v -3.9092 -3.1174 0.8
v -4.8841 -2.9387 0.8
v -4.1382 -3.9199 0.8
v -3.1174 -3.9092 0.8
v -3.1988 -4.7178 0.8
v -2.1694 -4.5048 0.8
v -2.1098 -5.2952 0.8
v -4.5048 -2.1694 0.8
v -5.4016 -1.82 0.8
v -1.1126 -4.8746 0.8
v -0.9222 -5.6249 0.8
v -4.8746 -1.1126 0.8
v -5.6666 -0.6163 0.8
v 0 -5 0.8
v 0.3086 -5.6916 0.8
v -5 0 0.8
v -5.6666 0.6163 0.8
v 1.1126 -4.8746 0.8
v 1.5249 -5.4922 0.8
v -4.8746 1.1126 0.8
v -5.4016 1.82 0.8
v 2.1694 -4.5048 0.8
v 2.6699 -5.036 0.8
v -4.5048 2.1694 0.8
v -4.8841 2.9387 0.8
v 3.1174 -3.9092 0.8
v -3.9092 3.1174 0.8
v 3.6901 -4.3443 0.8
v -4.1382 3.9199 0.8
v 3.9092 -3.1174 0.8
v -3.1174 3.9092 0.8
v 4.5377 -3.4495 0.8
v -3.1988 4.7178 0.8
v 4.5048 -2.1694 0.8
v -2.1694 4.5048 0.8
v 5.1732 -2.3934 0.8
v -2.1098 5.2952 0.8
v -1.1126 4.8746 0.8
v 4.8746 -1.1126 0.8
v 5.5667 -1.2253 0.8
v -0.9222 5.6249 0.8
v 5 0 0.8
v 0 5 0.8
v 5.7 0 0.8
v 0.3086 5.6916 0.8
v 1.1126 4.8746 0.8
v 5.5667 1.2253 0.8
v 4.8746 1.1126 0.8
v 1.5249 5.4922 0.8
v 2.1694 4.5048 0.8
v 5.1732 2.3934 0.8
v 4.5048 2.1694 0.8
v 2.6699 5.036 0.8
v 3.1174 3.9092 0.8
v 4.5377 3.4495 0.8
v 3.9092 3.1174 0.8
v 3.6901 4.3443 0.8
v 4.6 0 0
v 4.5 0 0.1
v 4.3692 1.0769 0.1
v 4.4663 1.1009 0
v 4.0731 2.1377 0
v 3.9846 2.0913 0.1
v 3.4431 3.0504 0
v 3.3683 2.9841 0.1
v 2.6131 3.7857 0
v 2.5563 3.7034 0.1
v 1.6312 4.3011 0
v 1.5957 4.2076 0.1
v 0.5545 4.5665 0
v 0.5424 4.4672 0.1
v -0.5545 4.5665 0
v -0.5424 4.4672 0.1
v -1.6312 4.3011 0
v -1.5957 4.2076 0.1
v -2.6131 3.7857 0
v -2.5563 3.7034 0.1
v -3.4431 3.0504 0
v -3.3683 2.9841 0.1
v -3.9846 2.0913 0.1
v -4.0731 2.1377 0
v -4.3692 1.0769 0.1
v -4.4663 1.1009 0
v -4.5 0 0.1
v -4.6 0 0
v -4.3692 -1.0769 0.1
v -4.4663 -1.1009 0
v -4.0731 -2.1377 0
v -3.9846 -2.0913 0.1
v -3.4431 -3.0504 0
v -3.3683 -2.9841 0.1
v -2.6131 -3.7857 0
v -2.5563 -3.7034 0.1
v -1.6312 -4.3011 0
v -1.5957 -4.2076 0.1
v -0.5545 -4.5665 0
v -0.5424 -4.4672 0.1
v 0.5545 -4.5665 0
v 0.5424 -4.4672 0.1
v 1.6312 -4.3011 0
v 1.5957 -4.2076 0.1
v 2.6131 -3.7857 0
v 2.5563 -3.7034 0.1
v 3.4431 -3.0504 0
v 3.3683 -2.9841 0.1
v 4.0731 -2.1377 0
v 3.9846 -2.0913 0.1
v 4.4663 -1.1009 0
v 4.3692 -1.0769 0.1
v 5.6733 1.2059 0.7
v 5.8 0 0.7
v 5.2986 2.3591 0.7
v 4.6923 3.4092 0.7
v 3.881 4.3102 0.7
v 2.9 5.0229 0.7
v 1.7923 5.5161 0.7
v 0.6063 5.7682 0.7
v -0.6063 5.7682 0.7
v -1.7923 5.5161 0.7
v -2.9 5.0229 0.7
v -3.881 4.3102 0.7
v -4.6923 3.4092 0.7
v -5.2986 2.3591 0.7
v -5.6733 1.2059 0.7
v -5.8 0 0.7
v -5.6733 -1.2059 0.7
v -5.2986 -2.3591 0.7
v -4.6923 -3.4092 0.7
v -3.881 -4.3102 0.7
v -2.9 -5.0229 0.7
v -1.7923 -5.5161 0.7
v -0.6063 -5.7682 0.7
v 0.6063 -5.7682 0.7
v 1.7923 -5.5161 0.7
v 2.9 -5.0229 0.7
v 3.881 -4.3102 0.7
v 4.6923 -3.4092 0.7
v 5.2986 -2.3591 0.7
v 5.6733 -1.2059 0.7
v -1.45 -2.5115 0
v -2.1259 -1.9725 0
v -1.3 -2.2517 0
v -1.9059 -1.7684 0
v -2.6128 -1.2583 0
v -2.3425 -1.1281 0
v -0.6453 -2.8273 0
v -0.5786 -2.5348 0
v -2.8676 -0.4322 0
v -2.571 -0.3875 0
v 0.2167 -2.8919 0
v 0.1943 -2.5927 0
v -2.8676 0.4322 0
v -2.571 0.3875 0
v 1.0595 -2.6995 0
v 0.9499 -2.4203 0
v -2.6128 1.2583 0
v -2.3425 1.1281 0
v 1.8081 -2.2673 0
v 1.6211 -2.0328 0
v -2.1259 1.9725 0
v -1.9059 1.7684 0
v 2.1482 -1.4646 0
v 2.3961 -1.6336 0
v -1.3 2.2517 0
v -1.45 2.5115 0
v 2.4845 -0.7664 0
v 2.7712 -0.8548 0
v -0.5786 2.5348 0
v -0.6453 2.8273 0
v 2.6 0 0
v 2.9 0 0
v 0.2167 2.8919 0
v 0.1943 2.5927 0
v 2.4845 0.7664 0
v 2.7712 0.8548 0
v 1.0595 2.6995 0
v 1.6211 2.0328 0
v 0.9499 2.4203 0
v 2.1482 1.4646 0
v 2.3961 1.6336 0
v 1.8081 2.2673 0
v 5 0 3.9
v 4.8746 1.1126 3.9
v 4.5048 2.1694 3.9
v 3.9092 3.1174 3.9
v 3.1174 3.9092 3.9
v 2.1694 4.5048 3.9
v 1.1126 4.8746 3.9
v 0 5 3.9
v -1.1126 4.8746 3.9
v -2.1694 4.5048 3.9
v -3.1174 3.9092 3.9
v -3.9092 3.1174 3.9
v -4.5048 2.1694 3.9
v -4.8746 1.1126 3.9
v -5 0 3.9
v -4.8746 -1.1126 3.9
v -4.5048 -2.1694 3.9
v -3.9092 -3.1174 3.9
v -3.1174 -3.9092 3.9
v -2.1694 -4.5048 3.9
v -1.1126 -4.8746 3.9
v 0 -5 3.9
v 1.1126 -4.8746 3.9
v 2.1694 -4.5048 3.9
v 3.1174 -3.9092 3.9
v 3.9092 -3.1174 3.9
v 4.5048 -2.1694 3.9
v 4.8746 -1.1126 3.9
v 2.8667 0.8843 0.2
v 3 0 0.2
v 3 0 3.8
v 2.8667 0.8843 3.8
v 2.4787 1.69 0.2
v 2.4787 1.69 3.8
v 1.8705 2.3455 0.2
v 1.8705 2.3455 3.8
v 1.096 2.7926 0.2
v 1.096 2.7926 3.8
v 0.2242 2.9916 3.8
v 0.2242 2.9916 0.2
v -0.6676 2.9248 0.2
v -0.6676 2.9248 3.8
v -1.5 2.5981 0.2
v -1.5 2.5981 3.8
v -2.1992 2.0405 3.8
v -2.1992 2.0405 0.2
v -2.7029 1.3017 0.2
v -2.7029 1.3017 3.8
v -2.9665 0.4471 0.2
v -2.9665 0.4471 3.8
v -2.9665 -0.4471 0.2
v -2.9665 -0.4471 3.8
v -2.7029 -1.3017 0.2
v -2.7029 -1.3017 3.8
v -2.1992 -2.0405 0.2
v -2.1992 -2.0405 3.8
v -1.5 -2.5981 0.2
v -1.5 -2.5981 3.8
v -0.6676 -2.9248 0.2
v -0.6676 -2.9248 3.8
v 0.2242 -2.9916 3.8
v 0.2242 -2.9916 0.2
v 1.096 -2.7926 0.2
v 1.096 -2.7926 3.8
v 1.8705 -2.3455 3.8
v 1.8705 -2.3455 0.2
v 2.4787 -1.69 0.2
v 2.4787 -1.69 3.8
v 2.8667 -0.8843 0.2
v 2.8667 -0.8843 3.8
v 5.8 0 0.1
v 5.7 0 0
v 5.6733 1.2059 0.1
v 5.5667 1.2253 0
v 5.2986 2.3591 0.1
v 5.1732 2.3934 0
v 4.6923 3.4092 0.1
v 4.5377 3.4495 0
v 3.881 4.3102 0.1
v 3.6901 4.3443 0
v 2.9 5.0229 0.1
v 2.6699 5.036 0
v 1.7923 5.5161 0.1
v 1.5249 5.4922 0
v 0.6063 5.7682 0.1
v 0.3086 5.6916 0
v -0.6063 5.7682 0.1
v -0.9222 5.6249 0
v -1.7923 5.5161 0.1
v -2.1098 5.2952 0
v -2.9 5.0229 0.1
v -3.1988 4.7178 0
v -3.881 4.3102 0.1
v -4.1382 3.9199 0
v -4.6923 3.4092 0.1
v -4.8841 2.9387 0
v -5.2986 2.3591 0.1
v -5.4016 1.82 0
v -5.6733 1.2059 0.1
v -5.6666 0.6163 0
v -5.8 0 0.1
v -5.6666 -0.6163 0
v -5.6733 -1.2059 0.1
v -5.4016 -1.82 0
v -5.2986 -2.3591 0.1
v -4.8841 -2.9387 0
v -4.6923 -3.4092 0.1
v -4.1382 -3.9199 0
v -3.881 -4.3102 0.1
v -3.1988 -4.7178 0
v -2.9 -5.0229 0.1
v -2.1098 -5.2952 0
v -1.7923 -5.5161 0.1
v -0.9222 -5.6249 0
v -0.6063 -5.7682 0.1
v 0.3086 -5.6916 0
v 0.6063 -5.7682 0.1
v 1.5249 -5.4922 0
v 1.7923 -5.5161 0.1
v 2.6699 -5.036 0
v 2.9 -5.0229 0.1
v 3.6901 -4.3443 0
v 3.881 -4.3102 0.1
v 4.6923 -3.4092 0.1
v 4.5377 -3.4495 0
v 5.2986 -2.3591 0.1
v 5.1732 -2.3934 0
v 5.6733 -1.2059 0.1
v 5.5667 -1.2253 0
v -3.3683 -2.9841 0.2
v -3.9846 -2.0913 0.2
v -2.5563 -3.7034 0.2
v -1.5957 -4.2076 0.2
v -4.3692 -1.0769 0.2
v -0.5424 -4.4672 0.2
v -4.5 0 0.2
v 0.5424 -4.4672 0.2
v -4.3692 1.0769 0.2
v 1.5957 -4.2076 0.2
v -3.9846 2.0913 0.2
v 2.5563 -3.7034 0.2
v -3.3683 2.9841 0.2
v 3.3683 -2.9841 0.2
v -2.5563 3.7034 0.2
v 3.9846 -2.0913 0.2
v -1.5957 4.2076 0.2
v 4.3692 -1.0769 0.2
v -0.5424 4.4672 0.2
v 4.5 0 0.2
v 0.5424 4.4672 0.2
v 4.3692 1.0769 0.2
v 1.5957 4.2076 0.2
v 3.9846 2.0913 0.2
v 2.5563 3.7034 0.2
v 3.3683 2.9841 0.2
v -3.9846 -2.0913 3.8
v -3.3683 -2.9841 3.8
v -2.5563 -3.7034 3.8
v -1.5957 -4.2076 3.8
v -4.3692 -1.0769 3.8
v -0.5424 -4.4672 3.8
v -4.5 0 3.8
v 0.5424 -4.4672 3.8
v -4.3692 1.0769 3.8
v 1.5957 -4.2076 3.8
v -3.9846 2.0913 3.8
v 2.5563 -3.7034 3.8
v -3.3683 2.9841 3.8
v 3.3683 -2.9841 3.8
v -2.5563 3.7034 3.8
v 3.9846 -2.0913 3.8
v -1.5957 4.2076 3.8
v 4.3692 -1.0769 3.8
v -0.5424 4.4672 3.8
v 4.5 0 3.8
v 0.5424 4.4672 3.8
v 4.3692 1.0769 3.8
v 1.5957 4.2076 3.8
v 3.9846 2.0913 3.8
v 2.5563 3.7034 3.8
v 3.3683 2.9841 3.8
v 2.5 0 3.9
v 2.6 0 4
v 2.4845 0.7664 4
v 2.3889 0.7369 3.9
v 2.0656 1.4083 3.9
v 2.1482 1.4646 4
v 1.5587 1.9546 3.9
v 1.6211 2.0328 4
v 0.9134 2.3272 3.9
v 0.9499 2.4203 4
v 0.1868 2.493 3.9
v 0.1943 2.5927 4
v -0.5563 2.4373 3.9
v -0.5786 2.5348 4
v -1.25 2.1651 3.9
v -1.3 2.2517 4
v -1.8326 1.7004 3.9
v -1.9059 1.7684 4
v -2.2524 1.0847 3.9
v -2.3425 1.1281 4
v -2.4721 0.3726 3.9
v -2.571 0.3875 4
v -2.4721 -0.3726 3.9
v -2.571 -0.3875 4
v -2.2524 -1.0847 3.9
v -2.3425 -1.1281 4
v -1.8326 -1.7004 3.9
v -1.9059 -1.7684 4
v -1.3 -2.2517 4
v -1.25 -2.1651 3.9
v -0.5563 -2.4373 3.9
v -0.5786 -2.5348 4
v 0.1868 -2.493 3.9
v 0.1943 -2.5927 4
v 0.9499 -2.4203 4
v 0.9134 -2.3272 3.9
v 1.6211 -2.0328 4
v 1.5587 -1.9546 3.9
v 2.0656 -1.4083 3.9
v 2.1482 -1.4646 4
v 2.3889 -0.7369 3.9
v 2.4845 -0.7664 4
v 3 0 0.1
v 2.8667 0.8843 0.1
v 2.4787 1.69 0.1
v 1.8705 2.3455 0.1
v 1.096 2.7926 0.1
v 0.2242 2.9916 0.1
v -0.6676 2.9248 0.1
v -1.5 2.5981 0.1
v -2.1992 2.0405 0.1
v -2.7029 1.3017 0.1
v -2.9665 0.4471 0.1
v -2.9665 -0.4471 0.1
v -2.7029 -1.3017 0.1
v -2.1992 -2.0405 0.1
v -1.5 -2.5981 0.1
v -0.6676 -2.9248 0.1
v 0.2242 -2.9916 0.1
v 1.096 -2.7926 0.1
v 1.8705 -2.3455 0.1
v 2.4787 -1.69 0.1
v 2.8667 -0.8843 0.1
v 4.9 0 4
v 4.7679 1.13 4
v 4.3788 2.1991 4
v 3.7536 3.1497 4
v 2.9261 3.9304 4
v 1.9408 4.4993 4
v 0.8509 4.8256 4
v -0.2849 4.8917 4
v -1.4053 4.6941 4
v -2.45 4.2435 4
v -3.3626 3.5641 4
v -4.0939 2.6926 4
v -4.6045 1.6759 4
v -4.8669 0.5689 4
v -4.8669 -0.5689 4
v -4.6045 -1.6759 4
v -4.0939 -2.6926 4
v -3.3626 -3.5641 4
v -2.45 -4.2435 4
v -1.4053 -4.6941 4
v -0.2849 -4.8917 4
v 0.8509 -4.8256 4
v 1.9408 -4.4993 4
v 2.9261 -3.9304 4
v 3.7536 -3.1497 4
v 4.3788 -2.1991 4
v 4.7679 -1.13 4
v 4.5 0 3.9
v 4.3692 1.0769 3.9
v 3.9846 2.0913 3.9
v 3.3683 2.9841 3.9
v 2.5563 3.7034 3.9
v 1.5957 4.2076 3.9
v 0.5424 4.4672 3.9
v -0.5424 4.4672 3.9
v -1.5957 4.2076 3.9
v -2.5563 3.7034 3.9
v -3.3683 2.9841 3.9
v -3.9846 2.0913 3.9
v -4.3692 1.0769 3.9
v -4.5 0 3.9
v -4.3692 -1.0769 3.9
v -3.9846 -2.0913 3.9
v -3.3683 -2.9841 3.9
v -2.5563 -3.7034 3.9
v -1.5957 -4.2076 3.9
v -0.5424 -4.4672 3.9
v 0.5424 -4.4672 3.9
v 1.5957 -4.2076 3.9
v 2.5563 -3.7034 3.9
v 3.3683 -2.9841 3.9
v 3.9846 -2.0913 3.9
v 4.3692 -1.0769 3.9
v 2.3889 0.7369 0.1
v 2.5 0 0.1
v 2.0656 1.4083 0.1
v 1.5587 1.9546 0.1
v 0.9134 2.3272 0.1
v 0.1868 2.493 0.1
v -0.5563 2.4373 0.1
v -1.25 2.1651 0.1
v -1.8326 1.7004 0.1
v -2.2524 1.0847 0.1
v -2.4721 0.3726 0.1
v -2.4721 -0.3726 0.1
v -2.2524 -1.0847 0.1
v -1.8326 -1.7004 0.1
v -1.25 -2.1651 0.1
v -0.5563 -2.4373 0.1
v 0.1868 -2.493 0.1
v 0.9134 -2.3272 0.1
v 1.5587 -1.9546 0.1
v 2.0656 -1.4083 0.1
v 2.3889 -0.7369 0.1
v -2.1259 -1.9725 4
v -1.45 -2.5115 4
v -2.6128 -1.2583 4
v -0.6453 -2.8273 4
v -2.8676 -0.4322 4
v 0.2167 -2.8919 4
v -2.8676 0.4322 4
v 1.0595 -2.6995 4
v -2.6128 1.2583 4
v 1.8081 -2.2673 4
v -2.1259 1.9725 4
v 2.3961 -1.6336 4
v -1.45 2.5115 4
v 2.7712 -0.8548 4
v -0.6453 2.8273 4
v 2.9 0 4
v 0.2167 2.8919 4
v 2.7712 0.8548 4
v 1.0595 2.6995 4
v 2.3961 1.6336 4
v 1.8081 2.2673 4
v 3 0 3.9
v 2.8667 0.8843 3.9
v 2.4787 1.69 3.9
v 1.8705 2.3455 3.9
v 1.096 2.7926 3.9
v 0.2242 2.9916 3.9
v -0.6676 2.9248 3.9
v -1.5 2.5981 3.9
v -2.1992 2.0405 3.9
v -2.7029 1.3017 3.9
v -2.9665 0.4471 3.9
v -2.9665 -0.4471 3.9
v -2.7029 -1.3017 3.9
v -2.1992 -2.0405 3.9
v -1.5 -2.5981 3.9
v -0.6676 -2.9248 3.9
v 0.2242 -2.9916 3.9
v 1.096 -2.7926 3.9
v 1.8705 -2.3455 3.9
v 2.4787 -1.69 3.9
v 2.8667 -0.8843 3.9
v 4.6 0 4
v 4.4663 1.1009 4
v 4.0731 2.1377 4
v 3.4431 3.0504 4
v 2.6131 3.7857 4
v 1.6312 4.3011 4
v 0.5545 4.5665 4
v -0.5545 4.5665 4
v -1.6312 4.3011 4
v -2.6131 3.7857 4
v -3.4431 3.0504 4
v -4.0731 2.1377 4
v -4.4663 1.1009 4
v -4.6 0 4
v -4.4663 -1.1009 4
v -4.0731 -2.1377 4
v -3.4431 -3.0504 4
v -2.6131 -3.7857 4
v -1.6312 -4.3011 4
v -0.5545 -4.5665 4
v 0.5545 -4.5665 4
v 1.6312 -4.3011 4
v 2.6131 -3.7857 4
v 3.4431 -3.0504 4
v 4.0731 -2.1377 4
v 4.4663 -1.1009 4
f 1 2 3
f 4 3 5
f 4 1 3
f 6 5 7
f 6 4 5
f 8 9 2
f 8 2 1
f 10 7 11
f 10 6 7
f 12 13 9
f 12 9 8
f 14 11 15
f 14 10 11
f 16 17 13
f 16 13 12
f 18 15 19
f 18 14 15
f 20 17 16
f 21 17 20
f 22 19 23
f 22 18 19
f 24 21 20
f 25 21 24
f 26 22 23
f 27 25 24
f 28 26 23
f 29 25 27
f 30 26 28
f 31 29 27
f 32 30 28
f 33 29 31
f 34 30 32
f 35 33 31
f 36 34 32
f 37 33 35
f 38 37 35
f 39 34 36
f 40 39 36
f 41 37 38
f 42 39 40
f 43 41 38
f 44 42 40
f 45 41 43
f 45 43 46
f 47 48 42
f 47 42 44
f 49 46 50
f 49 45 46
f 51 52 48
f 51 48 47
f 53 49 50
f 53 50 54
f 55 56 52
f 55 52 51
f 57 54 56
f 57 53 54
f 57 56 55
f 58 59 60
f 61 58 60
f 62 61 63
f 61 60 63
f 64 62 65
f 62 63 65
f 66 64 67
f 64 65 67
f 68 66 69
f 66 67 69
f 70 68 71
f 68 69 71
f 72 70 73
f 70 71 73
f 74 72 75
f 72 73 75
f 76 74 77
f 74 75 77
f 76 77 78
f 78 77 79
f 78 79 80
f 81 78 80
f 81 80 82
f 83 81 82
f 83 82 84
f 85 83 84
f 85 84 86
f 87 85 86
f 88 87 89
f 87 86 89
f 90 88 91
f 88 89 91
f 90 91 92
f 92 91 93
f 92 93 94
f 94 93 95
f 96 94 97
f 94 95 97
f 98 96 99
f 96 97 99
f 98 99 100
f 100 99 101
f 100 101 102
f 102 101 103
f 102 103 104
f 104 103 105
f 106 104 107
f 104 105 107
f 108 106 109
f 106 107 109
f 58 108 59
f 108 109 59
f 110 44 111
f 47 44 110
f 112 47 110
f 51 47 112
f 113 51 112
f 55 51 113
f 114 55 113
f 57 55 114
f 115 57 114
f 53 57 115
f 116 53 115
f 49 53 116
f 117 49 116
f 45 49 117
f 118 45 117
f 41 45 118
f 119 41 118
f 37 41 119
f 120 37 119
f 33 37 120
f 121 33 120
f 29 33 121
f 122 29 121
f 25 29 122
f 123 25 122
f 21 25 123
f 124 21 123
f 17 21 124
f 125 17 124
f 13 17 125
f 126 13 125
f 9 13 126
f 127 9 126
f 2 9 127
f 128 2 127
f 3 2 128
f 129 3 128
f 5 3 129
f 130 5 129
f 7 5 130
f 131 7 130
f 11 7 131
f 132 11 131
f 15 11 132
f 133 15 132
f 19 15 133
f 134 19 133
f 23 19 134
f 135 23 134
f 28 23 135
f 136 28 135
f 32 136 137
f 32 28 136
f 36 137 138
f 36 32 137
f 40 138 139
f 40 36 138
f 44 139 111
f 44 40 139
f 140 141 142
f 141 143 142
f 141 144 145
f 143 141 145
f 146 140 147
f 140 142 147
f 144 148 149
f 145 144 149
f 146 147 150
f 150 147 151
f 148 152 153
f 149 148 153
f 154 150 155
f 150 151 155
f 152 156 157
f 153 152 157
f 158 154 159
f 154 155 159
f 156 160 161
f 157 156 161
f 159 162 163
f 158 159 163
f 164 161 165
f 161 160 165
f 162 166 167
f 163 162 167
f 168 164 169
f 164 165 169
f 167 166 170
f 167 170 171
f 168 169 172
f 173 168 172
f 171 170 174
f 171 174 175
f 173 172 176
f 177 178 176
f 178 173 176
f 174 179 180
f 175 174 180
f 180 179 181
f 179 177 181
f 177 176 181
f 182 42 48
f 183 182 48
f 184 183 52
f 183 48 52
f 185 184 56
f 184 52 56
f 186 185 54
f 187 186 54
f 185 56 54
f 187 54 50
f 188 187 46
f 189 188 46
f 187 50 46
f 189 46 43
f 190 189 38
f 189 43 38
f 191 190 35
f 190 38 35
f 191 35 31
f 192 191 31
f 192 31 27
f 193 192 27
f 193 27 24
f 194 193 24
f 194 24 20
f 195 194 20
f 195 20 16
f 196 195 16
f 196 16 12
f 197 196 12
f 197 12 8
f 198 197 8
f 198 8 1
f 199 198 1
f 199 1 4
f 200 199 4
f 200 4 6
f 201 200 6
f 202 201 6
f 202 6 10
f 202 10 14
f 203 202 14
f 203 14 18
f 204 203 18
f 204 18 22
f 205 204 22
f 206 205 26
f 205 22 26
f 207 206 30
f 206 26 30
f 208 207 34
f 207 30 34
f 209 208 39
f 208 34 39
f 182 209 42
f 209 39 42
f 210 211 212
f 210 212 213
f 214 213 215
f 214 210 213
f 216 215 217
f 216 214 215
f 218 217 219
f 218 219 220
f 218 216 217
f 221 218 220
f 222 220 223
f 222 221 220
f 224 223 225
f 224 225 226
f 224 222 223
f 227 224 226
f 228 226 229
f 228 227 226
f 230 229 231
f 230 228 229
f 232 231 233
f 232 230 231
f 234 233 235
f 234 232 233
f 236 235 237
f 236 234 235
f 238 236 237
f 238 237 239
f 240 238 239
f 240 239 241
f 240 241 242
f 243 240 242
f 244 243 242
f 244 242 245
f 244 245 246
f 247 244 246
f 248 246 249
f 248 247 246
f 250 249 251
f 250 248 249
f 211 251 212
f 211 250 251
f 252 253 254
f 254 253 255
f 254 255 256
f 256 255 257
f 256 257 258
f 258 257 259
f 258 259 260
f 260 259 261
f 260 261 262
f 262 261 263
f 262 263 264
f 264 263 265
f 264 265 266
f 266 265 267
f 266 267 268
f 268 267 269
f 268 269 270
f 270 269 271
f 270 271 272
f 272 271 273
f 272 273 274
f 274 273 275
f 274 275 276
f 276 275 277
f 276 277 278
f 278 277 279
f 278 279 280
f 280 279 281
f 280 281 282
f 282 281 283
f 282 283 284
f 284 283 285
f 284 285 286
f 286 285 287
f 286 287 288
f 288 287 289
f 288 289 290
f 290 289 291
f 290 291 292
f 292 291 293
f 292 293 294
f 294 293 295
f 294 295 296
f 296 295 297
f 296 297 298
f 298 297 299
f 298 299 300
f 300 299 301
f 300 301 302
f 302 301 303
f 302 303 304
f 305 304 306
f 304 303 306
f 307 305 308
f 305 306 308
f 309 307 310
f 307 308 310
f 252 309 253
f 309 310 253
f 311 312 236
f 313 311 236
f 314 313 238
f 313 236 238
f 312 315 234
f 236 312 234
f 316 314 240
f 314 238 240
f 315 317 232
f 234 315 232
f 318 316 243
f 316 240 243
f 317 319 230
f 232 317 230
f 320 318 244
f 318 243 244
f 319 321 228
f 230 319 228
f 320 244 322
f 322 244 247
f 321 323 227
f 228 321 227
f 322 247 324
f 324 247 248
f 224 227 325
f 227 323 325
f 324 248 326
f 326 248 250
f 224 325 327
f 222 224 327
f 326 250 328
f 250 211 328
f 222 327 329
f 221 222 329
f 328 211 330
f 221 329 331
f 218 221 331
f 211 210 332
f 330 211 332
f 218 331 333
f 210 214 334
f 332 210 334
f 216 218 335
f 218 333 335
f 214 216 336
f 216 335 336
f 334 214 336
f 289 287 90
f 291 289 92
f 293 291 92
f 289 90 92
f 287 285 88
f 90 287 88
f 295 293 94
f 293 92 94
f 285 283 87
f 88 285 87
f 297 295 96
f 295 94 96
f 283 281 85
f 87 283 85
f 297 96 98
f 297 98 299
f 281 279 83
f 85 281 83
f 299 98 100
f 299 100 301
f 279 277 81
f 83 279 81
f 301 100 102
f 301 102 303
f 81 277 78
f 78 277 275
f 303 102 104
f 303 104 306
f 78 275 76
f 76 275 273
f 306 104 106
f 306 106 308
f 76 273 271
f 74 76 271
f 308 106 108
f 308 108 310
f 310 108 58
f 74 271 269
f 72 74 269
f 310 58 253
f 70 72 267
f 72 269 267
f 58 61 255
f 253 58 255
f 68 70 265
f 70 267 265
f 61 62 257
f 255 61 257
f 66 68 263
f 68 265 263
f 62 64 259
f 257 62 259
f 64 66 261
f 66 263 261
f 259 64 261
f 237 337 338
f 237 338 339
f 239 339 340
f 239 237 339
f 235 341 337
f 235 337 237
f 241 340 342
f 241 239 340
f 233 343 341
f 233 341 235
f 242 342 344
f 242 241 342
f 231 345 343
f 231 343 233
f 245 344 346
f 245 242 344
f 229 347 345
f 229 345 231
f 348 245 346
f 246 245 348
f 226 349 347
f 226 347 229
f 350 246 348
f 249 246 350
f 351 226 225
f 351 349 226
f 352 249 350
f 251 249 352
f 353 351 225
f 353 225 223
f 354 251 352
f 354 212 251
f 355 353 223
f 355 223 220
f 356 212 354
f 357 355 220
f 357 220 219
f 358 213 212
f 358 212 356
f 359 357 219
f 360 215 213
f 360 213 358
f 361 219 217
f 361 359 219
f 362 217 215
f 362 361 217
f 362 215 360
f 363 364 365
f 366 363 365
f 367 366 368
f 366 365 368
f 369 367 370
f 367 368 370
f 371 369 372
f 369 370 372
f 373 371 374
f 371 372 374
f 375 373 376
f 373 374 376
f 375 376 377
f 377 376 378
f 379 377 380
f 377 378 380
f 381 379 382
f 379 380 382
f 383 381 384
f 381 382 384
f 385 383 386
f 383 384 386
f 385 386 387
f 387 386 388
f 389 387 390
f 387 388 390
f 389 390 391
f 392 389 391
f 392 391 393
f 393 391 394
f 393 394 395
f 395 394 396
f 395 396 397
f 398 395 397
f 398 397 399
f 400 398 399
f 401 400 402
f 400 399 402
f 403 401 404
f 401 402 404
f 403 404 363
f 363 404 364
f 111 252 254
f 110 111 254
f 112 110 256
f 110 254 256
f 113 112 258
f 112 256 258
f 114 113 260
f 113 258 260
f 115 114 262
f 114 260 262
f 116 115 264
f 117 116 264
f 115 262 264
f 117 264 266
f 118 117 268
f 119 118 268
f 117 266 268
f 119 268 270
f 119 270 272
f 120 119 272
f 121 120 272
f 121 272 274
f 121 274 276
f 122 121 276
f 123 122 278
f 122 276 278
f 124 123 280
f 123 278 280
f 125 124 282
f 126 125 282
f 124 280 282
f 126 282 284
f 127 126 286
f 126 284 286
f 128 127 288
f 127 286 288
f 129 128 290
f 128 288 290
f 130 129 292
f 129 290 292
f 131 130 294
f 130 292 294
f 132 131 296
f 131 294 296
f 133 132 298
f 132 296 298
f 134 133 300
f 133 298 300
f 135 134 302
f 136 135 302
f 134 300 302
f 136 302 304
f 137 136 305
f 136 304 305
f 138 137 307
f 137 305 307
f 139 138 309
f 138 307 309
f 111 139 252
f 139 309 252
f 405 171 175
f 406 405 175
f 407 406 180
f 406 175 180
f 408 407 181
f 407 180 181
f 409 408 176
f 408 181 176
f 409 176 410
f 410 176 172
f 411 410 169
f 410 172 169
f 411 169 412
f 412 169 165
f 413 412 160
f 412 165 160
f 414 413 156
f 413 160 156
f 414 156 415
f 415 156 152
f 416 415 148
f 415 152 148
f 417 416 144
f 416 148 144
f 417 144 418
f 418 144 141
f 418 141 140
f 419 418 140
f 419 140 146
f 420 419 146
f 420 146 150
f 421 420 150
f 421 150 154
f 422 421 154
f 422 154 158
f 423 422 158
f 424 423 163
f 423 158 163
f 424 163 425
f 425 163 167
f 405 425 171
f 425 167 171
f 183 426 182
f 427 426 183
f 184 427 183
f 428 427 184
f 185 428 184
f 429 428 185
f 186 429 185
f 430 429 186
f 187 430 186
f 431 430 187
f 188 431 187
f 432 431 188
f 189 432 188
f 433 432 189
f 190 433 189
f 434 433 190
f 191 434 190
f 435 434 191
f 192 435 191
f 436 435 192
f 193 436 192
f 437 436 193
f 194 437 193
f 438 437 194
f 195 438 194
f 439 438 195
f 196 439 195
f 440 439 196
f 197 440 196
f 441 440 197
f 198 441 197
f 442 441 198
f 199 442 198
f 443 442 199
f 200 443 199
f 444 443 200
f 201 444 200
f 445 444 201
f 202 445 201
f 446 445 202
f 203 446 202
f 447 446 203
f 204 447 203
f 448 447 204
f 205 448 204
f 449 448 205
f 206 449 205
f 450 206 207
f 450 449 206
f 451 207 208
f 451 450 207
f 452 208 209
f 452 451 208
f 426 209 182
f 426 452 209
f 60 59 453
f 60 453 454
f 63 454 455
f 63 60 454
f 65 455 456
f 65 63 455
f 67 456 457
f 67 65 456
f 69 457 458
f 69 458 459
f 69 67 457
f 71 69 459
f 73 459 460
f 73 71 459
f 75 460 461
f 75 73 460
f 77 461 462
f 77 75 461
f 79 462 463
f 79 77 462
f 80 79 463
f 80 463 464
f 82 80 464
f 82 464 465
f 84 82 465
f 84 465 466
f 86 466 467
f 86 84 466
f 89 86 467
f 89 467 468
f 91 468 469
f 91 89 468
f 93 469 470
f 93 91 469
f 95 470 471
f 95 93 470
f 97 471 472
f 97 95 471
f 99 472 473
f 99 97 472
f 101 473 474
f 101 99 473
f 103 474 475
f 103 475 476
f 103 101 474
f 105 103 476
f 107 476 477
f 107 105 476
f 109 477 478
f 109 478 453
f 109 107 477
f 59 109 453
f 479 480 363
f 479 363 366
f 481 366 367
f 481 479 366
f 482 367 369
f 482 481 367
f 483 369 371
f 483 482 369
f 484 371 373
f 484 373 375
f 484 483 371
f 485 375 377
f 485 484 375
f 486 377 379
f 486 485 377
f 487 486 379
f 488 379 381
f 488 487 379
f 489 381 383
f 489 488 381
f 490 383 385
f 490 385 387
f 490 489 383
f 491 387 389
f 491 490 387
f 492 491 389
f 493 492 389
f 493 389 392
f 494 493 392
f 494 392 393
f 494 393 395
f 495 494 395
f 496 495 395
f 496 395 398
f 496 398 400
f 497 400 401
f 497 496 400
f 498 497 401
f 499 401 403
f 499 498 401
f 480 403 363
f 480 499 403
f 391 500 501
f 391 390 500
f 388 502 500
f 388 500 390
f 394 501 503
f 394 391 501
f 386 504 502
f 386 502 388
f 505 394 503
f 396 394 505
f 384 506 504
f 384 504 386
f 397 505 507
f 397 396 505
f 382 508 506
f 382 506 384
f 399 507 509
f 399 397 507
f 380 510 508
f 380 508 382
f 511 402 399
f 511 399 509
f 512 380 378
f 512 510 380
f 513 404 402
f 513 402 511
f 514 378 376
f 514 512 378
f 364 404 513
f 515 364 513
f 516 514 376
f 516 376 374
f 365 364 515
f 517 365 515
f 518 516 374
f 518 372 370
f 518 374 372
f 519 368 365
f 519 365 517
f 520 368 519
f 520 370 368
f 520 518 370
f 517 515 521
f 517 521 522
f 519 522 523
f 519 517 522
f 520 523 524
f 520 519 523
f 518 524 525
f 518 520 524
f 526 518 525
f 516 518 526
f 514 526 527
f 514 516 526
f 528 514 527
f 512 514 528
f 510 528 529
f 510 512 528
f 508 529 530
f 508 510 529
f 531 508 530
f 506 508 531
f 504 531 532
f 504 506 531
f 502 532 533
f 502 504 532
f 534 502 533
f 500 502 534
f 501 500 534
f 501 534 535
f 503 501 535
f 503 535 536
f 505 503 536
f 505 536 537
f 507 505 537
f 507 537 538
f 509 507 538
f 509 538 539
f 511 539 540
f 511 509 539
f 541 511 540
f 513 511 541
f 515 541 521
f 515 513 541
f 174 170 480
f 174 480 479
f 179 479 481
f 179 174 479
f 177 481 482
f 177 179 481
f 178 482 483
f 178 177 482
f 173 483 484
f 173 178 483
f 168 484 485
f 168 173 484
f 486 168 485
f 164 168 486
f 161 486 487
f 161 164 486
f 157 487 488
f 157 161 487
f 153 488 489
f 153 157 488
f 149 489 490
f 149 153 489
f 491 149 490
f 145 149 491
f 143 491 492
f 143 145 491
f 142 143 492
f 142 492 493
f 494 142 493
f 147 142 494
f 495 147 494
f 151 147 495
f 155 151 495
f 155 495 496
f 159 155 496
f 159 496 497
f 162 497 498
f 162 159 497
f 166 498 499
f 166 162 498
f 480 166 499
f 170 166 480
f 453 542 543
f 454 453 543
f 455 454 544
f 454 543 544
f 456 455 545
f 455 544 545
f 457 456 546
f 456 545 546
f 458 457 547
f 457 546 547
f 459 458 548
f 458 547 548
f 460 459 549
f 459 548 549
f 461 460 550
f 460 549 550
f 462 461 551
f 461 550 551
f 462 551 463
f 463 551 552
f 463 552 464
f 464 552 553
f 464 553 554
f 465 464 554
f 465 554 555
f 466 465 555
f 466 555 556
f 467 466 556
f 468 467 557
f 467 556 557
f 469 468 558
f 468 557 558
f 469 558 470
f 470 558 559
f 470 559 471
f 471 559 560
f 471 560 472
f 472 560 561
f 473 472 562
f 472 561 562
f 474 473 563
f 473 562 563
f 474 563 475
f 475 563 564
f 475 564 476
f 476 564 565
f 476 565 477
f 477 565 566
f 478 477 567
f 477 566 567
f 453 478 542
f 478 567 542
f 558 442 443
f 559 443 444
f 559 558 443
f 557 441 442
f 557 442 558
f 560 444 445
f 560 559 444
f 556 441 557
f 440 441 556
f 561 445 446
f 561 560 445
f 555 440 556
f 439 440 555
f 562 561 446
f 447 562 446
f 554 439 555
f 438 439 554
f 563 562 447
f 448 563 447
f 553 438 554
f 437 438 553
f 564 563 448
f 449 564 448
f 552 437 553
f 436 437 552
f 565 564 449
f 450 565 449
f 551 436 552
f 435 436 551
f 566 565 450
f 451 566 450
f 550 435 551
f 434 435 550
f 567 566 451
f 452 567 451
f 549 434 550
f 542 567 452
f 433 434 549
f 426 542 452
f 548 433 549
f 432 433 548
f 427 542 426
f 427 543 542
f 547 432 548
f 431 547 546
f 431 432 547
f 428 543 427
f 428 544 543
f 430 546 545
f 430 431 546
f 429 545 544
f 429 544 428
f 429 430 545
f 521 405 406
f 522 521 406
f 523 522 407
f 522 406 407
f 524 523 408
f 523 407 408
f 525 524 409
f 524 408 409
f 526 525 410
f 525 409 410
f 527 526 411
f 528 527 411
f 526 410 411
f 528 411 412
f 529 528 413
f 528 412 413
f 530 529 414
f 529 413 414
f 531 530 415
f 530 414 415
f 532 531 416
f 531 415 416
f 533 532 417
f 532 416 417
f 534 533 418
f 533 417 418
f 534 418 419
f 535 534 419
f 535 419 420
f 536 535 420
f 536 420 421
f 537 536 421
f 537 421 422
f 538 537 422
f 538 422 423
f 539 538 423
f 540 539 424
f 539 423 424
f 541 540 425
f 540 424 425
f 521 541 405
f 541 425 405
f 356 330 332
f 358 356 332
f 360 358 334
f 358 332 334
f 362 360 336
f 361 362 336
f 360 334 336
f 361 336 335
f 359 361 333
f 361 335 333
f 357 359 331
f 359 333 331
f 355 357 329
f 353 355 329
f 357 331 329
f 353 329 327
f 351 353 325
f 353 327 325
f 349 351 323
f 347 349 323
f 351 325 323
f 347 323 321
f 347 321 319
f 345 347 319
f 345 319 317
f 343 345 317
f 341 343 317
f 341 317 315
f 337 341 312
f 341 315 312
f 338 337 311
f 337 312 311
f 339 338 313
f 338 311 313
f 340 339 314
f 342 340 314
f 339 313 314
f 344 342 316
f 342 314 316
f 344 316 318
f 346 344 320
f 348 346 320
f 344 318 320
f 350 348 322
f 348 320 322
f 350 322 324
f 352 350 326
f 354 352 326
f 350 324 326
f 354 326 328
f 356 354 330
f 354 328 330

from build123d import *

# Parameters (mm, degrees)
F0_R      = 3
F0_R_2    = 2.5
F1_DEPTH  = 4
F0_R_3    = 5
F0_R_4    = 4.5
F0_R_5    = 5.8
F2_DEPTH  = 0.8
F3_START  = 0.2
F3_DEPTH  = 3.6
F4_SIZE   = 0.1
F4_2_SIZE = 0.1


with BuildPart() as f1:
    # F0 (on Top) → F1 (new body)
    with BuildSketch(Plane.XY):
        Circle(F0_R)
        Circle(F0_R_2, mode=Mode.SUBTRACT)
    extrude(amount=F1_DEPTH)

    # F4#2
    f4_2_edges = [f1.edges().sort_by_distance(p)[0] for p in [
        (-3, 0, 0),
        (-2.5, 0, 0),
        (-3, 0, 4),
        (-2.5, 0, 4),
    ]]
    chamfer(f4_2_edges, length=F4_2_SIZE)


with BuildPart() as f1b:
    # F0 (on Top) → F1, piece 2 (new body)
    with BuildSketch(Plane.XY):
        Circle(F0_R_3)
        Circle(F0_R_4, mode=Mode.SUBTRACT)
    extrude(amount=F1_DEPTH)

    # F0 (on Top) → F2 (join)
    with BuildSketch(Plane.XY):
        Circle(F0_R_5)
        Circle(F0_R_3, mode=Mode.SUBTRACT)
    extrude(amount=F2_DEPTH)

    # F4
    f4_edges = [f1b.edges().sort_by_distance(p)[0] for p in [
        (-5.8, 0, 0),
        (-4.5, 0, 0),
        (-5, 0, 4),
        (-4.5, 0, 4),
        (-5.8, 0, 0.8),
    ]]
    chamfer(f4_edges, length=F4_SIZE)


with BuildPart() as f3:
    # F0 (on Top) → F3 (new body)
    with BuildSketch(Plane.XY.offset(F3_START)):
        Circle(F0_R_4)
        Circle(F0_R, mode=Mode.SUBTRACT)
    extrude(amount=F3_DEPTH)


solid = Compound([f1.part, f1b.part, f3.part])
